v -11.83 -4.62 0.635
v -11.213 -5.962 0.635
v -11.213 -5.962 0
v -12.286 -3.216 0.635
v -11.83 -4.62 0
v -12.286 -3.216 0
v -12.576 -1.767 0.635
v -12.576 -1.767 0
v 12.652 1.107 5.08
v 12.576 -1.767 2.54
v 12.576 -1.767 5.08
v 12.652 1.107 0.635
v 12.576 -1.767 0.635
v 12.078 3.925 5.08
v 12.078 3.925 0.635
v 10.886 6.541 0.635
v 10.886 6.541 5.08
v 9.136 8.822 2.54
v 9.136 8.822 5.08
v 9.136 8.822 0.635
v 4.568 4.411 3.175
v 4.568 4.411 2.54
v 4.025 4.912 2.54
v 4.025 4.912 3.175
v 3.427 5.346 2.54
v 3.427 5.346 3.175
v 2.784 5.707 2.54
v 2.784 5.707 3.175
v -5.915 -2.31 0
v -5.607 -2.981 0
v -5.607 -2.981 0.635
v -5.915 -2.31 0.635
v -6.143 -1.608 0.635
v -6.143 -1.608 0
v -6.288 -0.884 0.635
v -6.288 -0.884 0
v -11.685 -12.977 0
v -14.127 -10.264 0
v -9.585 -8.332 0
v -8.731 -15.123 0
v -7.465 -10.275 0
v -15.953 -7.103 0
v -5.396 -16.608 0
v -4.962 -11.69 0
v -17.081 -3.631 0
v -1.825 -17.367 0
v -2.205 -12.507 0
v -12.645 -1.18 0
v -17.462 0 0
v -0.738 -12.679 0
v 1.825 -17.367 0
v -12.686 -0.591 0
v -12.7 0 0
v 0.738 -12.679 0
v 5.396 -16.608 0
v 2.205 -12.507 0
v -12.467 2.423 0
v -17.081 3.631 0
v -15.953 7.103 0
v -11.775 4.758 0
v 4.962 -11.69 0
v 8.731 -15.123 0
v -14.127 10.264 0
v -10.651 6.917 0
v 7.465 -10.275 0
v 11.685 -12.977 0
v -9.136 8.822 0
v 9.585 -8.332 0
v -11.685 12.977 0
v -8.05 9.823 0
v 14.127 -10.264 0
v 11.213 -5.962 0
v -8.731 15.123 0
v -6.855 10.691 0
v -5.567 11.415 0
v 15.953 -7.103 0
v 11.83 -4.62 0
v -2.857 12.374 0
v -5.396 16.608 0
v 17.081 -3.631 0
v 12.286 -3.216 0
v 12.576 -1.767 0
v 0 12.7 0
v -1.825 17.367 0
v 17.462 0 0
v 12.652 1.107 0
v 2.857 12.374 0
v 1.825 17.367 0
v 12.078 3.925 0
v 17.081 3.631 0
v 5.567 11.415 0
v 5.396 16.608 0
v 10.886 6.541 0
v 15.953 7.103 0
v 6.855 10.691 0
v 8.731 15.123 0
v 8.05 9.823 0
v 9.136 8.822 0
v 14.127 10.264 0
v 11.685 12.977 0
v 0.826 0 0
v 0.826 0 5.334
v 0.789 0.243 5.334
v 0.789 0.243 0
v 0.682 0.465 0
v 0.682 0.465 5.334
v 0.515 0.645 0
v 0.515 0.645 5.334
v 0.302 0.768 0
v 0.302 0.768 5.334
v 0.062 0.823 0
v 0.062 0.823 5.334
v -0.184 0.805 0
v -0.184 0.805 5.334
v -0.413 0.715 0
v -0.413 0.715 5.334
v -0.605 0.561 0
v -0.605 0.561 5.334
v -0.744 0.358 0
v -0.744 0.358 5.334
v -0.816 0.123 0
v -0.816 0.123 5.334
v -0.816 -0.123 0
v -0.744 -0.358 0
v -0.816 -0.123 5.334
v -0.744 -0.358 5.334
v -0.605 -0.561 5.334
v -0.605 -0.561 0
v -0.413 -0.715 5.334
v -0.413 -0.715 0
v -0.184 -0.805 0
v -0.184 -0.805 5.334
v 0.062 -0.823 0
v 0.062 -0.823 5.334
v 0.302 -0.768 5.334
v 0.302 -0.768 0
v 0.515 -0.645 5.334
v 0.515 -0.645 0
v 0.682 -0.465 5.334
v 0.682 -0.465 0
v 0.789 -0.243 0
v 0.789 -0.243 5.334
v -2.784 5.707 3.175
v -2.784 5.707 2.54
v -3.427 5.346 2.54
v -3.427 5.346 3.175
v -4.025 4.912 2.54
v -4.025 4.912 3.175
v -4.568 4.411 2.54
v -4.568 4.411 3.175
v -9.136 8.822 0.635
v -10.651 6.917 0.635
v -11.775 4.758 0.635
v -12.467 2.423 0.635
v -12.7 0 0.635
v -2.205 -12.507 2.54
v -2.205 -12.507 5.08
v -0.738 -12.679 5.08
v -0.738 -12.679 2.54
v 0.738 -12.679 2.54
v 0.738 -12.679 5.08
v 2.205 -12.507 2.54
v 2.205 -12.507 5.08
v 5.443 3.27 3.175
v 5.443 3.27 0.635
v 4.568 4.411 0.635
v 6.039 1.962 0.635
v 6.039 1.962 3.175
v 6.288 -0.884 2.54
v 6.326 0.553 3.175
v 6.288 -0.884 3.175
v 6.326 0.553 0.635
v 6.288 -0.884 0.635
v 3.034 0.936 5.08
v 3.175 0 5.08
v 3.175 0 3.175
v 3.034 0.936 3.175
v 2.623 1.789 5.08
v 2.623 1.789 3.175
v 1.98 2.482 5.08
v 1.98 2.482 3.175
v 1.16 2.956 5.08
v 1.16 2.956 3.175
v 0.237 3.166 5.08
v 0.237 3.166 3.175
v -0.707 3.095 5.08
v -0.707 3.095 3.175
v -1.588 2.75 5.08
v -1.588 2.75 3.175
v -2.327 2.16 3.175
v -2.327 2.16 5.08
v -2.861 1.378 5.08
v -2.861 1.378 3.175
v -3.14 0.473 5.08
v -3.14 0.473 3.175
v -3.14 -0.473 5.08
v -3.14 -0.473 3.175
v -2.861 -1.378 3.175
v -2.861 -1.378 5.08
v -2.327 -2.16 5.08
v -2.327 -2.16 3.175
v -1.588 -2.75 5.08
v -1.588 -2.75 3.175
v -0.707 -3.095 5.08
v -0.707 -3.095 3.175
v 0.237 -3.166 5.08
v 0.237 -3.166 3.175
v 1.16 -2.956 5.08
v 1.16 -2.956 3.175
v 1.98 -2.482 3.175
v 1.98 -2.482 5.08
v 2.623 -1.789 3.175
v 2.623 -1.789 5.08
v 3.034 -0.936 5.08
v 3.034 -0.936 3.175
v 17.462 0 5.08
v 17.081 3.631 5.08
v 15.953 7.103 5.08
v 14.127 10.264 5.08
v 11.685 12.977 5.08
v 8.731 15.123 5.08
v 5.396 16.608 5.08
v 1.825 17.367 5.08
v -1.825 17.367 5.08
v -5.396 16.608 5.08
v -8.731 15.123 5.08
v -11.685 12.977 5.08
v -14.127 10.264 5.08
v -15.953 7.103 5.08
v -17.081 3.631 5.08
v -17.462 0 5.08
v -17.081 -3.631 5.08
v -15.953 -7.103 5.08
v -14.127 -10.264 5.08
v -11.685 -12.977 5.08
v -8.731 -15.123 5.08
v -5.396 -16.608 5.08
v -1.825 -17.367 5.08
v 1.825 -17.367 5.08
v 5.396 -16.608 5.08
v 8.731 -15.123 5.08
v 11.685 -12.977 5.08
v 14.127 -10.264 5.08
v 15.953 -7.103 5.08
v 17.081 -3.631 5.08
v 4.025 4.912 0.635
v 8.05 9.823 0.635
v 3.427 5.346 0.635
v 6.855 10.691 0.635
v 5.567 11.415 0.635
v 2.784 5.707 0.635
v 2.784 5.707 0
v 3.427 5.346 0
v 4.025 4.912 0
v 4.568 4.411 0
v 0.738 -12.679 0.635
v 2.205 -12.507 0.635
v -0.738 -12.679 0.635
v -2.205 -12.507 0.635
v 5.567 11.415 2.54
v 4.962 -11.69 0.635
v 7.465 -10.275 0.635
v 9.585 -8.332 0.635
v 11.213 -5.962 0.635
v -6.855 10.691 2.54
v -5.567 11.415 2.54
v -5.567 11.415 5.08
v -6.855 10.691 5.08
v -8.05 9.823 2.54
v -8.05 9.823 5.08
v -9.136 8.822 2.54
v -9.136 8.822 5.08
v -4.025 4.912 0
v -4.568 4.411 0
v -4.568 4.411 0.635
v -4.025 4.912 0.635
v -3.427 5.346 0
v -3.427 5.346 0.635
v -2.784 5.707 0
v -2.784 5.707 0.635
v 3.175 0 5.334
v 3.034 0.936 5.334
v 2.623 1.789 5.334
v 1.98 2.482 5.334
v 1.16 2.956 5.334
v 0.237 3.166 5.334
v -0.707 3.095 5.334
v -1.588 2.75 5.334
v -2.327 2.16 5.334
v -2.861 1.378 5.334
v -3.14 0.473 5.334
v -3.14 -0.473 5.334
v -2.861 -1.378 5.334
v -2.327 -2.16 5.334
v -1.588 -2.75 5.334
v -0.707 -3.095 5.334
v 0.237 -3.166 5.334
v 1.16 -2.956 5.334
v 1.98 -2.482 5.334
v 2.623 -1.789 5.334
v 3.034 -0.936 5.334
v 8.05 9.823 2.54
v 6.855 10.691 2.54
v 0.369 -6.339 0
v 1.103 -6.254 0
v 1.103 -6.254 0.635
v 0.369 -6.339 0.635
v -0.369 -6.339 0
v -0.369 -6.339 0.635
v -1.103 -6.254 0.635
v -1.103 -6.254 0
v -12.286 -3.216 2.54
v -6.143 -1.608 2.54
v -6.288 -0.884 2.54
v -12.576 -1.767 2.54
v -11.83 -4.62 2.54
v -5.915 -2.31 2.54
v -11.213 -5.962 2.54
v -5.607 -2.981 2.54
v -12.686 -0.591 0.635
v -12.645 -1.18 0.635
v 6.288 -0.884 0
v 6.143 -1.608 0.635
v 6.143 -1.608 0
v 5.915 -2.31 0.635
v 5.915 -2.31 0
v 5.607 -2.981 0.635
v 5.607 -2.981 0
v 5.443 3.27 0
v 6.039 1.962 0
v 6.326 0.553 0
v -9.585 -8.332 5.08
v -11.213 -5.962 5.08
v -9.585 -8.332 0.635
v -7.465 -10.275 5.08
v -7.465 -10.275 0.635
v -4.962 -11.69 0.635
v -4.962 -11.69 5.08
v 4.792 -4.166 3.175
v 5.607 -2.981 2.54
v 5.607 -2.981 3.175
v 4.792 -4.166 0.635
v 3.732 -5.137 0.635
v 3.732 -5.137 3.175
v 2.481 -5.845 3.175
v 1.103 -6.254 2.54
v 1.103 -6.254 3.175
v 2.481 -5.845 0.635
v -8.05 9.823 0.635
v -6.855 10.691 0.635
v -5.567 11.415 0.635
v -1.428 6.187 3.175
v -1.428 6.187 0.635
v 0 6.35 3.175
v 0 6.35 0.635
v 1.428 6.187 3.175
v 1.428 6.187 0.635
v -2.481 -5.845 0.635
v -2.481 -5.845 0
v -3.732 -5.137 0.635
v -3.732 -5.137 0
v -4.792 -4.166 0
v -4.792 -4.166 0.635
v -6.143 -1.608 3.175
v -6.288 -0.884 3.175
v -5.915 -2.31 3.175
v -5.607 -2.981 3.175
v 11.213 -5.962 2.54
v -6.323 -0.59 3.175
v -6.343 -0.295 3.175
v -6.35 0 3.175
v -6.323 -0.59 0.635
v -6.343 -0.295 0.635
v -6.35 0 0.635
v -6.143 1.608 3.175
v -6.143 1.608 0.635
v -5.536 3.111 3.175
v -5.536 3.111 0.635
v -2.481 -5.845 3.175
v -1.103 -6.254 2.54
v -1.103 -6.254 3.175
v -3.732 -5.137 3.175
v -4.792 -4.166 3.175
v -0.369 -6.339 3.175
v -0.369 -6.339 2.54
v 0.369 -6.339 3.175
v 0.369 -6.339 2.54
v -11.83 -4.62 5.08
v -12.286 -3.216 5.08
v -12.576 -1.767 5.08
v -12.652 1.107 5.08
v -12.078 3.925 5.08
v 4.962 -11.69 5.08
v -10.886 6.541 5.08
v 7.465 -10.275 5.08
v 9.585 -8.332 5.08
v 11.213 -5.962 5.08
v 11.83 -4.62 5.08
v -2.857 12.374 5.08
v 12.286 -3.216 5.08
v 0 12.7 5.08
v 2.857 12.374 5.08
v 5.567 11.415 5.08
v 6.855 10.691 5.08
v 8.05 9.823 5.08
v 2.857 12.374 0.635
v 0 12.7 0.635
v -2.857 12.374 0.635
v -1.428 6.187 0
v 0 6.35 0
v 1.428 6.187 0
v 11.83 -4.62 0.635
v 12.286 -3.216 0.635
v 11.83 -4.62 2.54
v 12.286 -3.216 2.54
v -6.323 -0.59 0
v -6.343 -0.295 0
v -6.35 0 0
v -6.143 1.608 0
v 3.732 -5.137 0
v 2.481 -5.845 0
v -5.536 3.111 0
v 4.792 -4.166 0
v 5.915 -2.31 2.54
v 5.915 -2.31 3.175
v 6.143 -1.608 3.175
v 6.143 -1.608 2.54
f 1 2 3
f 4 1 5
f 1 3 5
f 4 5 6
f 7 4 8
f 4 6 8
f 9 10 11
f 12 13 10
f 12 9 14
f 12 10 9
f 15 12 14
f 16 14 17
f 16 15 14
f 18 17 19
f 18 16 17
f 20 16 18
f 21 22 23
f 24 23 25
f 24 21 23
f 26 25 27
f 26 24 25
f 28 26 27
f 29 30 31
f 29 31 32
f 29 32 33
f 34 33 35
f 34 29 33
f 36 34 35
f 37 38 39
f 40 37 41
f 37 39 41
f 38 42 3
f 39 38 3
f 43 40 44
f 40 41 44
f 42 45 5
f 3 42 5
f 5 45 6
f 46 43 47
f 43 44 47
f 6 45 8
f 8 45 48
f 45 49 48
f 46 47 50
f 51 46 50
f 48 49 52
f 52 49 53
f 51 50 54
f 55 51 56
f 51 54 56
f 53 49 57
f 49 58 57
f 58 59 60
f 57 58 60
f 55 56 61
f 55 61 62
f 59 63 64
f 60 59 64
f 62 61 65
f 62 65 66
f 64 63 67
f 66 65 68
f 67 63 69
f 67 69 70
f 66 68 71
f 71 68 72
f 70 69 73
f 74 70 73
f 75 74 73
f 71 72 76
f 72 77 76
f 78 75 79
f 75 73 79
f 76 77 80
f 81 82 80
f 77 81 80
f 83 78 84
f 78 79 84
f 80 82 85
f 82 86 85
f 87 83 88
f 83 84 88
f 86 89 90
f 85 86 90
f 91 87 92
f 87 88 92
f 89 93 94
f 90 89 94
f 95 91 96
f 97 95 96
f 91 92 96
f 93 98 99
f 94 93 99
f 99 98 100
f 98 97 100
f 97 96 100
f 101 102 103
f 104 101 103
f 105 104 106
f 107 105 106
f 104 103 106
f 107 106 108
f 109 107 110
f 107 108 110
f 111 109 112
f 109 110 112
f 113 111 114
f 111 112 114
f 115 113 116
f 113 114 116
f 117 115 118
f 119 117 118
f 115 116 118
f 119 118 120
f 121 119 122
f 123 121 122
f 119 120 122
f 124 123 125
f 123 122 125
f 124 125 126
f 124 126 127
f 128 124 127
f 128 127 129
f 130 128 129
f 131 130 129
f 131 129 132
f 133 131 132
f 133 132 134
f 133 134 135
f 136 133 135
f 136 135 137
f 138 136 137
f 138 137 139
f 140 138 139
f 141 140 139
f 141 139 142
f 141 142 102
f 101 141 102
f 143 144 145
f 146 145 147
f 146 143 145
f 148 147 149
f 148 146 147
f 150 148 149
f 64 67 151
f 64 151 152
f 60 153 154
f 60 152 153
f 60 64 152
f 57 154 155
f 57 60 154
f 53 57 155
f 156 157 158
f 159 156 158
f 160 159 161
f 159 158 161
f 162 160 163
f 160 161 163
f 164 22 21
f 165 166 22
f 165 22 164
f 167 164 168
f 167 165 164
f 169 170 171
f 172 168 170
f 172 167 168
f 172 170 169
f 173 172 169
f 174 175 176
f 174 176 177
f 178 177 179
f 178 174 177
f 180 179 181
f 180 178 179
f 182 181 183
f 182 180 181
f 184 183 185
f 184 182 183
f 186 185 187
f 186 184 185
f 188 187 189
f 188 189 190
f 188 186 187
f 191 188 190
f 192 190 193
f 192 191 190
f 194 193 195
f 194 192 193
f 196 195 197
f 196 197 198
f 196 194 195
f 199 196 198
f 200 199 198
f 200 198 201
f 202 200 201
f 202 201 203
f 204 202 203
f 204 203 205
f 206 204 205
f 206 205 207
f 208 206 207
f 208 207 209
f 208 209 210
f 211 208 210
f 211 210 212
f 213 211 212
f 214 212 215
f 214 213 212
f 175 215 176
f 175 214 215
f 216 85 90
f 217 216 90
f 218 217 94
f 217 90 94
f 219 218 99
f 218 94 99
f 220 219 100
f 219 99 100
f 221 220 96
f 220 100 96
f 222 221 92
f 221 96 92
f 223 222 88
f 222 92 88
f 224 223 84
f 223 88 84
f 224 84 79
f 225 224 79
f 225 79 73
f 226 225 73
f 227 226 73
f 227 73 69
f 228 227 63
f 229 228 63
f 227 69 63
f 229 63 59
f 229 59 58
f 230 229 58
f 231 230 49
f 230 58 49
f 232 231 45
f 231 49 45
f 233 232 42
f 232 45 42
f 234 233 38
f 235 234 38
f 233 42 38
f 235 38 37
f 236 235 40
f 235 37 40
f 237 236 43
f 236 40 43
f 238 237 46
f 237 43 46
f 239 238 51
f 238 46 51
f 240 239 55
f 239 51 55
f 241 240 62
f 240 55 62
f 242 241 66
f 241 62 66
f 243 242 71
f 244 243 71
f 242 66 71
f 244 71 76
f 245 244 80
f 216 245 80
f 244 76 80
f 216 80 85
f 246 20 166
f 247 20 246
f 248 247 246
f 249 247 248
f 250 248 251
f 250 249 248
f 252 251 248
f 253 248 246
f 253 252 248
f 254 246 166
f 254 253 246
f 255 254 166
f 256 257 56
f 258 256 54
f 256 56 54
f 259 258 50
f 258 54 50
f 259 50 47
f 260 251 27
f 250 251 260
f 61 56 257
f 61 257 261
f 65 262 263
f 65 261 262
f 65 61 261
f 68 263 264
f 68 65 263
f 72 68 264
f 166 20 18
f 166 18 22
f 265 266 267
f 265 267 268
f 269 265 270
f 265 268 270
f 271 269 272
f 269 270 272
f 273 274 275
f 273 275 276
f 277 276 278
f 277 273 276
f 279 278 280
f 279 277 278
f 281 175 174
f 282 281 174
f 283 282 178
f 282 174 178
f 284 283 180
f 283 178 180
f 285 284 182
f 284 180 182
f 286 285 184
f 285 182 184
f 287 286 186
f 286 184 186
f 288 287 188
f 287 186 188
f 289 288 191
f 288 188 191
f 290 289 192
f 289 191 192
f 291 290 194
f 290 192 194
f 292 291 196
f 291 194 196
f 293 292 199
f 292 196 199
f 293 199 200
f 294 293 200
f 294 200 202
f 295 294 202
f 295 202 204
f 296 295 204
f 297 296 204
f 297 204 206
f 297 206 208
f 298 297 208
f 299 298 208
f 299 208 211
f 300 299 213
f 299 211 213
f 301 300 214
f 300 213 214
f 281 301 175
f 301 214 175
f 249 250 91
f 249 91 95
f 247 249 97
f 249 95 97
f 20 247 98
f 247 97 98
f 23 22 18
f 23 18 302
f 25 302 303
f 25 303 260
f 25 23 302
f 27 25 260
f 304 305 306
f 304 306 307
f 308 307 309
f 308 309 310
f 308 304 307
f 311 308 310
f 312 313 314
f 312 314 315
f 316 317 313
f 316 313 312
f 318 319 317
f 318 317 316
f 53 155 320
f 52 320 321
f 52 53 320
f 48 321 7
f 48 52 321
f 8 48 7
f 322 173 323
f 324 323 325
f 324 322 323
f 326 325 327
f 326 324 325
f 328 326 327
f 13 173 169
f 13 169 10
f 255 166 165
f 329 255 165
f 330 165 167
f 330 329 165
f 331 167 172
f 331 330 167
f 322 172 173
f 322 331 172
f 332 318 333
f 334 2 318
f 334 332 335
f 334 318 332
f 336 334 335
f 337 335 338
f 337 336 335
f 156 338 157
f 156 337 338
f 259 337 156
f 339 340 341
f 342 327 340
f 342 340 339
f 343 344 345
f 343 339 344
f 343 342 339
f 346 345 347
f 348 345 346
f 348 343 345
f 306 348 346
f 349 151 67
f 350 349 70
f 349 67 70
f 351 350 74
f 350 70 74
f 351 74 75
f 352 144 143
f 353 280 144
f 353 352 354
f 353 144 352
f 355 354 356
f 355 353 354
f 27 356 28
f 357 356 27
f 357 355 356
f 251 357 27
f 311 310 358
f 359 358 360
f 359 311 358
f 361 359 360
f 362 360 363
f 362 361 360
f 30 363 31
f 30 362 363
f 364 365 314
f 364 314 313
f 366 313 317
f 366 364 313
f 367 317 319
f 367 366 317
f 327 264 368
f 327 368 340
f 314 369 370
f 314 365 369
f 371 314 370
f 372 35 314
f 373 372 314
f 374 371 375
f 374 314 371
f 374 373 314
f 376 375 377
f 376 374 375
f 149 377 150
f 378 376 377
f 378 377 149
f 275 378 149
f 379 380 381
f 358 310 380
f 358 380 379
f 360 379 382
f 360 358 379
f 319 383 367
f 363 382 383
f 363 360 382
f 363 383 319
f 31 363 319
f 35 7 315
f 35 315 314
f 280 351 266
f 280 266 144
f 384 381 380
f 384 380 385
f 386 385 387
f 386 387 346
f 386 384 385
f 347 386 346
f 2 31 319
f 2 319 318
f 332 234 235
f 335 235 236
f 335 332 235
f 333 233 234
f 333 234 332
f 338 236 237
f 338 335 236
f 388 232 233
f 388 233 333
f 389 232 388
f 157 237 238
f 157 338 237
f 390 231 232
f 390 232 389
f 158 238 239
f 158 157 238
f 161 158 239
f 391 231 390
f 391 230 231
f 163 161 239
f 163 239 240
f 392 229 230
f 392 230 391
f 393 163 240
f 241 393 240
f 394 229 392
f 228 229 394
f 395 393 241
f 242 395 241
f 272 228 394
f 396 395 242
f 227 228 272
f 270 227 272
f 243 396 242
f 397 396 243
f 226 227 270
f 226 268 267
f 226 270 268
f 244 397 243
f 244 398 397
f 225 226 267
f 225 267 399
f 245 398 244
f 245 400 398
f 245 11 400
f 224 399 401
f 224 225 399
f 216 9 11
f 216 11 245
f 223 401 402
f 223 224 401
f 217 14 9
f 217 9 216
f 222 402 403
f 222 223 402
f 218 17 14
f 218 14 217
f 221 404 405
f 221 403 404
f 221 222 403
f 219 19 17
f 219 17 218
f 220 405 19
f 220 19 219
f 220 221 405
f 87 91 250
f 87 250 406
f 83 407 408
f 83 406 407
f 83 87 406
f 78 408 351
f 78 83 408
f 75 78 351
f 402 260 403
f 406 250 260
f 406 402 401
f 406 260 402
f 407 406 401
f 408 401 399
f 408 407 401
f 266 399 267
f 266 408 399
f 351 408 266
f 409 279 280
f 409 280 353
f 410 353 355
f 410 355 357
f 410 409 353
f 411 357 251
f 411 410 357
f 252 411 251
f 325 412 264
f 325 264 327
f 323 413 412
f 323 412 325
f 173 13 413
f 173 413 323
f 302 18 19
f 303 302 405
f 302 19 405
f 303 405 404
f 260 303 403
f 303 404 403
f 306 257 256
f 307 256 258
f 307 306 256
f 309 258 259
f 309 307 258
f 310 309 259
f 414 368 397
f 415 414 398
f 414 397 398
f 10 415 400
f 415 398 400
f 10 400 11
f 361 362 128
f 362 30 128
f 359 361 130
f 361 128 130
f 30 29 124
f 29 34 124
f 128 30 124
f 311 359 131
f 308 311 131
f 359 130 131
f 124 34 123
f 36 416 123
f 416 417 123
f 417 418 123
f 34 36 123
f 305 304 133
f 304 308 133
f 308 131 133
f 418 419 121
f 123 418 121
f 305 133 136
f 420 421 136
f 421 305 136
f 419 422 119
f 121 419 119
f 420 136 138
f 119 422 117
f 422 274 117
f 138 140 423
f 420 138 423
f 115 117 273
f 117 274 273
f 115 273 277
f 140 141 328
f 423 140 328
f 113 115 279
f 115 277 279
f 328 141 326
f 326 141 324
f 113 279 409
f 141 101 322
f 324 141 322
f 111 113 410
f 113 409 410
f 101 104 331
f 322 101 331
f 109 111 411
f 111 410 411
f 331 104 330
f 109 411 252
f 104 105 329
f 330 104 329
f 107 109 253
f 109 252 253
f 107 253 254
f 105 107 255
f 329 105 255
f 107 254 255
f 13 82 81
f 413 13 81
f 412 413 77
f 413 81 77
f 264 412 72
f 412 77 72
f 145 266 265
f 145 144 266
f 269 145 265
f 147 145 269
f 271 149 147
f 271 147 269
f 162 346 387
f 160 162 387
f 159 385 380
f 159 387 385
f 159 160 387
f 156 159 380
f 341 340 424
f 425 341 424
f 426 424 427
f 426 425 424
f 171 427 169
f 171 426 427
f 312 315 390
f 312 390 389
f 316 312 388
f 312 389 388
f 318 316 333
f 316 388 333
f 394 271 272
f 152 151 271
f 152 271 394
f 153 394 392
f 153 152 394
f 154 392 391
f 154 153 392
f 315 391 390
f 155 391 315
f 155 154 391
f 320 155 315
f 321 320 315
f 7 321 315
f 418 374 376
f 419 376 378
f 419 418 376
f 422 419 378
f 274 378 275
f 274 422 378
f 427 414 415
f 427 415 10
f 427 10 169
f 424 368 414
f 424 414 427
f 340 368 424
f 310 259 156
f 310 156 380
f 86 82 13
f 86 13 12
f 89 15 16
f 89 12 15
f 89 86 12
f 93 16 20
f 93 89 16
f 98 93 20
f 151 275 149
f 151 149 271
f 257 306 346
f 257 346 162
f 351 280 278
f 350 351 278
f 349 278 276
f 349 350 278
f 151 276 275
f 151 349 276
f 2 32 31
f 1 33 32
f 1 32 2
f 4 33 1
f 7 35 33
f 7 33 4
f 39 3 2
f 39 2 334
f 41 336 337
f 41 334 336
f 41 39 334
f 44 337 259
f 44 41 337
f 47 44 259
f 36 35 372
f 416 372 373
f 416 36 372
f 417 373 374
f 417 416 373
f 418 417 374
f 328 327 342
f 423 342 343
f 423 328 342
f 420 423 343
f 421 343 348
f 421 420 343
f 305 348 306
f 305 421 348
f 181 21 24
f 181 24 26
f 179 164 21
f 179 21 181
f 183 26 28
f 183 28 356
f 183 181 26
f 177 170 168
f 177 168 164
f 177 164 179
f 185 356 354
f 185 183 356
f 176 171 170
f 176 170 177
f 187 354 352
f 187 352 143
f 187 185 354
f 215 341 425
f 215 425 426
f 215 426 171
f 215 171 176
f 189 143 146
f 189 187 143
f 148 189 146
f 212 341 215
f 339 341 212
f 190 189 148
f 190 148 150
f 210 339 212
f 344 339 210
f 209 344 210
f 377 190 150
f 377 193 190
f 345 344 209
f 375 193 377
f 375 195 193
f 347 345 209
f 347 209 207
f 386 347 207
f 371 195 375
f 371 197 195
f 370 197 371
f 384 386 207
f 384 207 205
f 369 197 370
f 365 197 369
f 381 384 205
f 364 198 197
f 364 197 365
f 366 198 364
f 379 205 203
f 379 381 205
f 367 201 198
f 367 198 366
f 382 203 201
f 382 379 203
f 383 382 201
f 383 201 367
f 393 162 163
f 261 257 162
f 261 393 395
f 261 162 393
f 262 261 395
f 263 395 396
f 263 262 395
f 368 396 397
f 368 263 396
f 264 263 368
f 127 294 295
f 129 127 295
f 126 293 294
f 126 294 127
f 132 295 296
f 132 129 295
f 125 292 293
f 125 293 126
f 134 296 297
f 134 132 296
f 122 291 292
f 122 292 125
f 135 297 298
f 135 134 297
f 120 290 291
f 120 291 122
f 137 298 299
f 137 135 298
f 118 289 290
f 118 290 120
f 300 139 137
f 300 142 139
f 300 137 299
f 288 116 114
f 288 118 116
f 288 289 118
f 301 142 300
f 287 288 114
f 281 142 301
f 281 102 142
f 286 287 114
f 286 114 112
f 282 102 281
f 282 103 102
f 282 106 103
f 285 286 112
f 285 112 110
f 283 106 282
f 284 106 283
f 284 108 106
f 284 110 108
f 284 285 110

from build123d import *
from build123d.topology import SkipClean

# Parameters (mm, degrees)
SKETCH1_R           = 17.4625
BOSS_EXTRUDE1_DEPTH = 5.08
CUT_EXTRUDE1_DEPTH  = 5.08
SKETCH3_R           = 3.175
BOSS_EXTRUDE2_DEPTH = 0.254
SKETCH4_R           = 0.8255
CUT_EXTRUDE2_DEPTH  = 6.334
SKETCH5_R           = 12.7
SKETCH5_R_2         = 6.35
CUT_EXTRUDE3_DEPTH  = 2.54
SKETCH6_R           = 12.7
SKETCH6_R_2         = 6.35
CUT_EXTRUDE4_DEPTH  = 0.635
SKETCH7_R           = 6.35
SKETCH7_R_2         = 3.175
CUT_EXTRUDE5_DEPTH  = 1.905


with BuildPart() as part:
    # Sketch1 → Boss-Extrude1 (new body)
    with BuildSketch(Plane.XY):
        Circle(SKETCH1_R)
    extrude(amount=BOSS_EXTRUDE1_DEPTH)

    # Sketch2 → Cut-Extrude1 (cut)
    with BuildSketch(Plane(origin=(0, 0, 0), x_dir=(-1, 0, 0), z_dir=(0, 0, -1))):
        with BuildLine():
            Line((2.205331856, -12.507058463), (1.102665928, -6.253529232))
            ThreePointArc((1.102665928, -6.253529232), (3.732436352, -5.137257914), (5.606717215, -2.981144424))
            Line((5.606717215, -2.981144424), (11.213434429, -5.962288847))
            ThreePointArc((11.213434429, -5.962288847), (7.464872704, -10.274515829), (2.205331856, -12.507058463))
        make_face()
        with BuildLine():
            Line((-1.102665928, -6.253529232), (-2.205331856, -12.507058463))
            ThreePointArc((-2.205331856, -12.507058463), (-7.464872704, -10.274515829), (-11.213434429, -5.962288847))
            Line((-11.213434429, -5.962288847), (-5.606717215, -2.981144424))
            ThreePointArc((-5.606717215, -2.981144424), (-3.732436352, -5.137257914), (-1.102665928, -6.253529232))
        make_face()
        with BuildLine():
            Line((-6.288202237, -0.883749191), (-12.576404473, -1.767498382))
            ThreePointArc((-12.576404473, -1.767498382), (-12.078417757, 3.924515829), (-9.135615464, 8.822161305))
            Line((-9.135615464, 8.822161305), (-4.567807732, 4.411080652))
            ThreePointArc((-4.567807732, 4.411080652), (-6.039208878, 1.962257914), (-6.288202237, -0.883749191))
        make_face()
        with BuildLine():
            Line((-2.783656782, 5.707342194), (-5.567313564, 11.414684388))
            ThreePointArc((-5.567313564, 11.414684388), (0, 12.7), (5.567313564, 11.414684388))
            Line((5.567313564, 11.414684388), (2.783656782, 5.707342194))
            ThreePointArc((2.783656782, 5.707342194), (0, 6.35), (-2.783656782, 5.707342194))
        make_face()
        with BuildLine():
            Line((4.567807732, 4.411080652), (9.135615464, 8.822161305))
            ThreePointArc((9.135615464, 8.822161305), (12.078417757, 3.924515829), (12.576404473, -1.767498382))
            Line((12.576404473, -1.767498382), (6.288202237, -0.883749191))
            ThreePointArc((6.288202237, -0.883749191), (6.039208878, 1.962257914), (4.567807732, 4.411080652))
        make_face()
    extrude(amount=-CUT_EXTRUDE1_DEPTH, mode=Mode.SUBTRACT)

    # Sketch3 → Boss-Extrude2 (add)
    with BuildSketch(Plane.XY.offset(5.08)):
        Circle(SKETCH3_R)
    extrude(amount=BOSS_EXTRUDE2_DEPTH)

    # Sketch4 → Cut-Extrude2 (cut, through all)
    with BuildSketch(Plane.XY.offset(5.334)):
        Circle(SKETCH4_R)
    extrude(amount=-CUT_EXTRUDE2_DEPTH, mode=Mode.SUBTRACT)

    # Sketch5 → Cut-Extrude3 (cut)
    with BuildSketch(Plane.XY.offset(5.08)):
        with Locations(Location((0, 0, 0), (0, 0, 180))):  # turned: the seam where the file's is
            Circle(SKETCH5_R)
        with Locations(Location((0, 0, 0), (0, 0, 180))):  # turned: the seam where the file's is
            Circle(SKETCH5_R_2, mode=Mode.SUBTRACT)
    extrude(amount=-CUT_EXTRUDE3_DEPTH, mode=Mode.SUBTRACT)

    # Sketch6 → Cut-Extrude4 (cut)
    with SkipClean():  # keep this step's faces unmerged: merging them makes the solid invalid here
        with BuildSketch(Plane(origin=(0, 0, 0), x_dir=(-1, 0, 0), z_dir=(0, 0, -1))):
            Circle(SKETCH6_R)
            Circle(SKETCH6_R_2, mode=Mode.SUBTRACT)
        extrude(amount=-CUT_EXTRUDE4_DEPTH, mode=Mode.SUBTRACT)

    # Sketch7 → Cut-Extrude5 (cut)
    with SkipClean():  # keep this step's faces unmerged: merging them makes the solid invalid here
        with BuildSketch(Plane.XY.offset(5.08)):
            with Locations(Location((0, 0, 0), (0, 0, 180))):  # turned: the seam where the file's is
                Circle(SKETCH7_R)
            Circle(SKETCH7_R_2, mode=Mode.SUBTRACT)
        extrude(amount=-CUT_EXTRUDE5_DEPTH, mode=Mode.SUBTRACT)


solid = part.part
